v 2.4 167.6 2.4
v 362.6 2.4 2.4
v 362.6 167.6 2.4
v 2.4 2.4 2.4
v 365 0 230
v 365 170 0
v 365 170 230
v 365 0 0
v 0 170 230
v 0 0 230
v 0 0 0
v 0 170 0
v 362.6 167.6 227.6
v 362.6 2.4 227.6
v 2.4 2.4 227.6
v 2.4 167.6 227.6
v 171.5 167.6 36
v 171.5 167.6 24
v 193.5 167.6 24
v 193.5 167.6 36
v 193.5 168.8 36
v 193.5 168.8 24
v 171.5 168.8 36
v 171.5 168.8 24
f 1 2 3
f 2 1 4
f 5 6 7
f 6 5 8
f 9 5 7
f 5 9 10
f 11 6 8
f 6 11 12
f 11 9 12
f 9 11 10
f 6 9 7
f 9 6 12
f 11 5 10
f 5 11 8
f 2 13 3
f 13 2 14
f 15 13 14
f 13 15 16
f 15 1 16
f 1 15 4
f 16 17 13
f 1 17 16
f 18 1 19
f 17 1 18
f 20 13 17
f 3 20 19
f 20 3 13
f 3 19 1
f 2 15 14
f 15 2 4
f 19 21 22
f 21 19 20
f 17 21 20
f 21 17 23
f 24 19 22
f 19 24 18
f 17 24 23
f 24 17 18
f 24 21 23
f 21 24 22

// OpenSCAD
// ============================================================
//  ZhiGuo E-Nose Chamber Box  (v7)
//  Sealed gas measurement box. For photos, lift the lid and
//  use your own phone stand at a fixed height/position.
//  White tray + color-card recess keeps photo color stable.
//
//  Parts (export STL one by one):
//    sealed_box()    - big open-top box (device + sample)
//    sliding_lid()   - lid with sliding acrylic window
//    slide_stop()    - end stop glued on the lid (acrylic slide-in)
//    usb_plug()      - plug for the USB hole
//    sample_tray()   - white tray + color card recess
//
//  Acrylic sheet to buy: 3mm, cut to panel_w x panel_d
//  Free software: https://openscad.org
// ============================================================

$fn = 60;

// ---------- BOX ----------
box_w = 365;   // outer width X (device is 350mm long)
box_d = 170;   // outer depth Y (device is 150mm wide)
box_h = 230;   // outer height Z (device ~200mm + lid lip room)

wall   = 2.4;
floor  = 2.4;

// ---------- SLIDING WINDOW LID ----------
lid_t = 4;            // lid plate thickness
slide_t = 3;          // acrylic sheet thickness (buy 3mm)
slide_tol = 0.6;      // acrylic clearance inside the pocket
win_w = 200;          // window width X
win_d = 90;           // window depth Y
slide_travel = 80;    // how far the acrylic slides to open
overlap = 5;          // acrylic overlap over window when closed
rail_m = 6;           // margin from window edge to pocket wall
wall_h = slide_t + 3; // pocket wall height above the plate
tol = 0.4;            // clearance between lid lip and box
lip_d = 8;            // lid lip depth into the box

// ---------- USB / CABLE ----------
usb_w = 22; usb_h = 12; usb_center_z = 30;   // big enough for the USB cable
plug_w = 24; plug_h = 14; plug_l = 14;

// ---------- MISC ----------
post_d = 6; post_h = 6;

// ---------- COMPUTED ----------
inner_w = box_w - 2*wall;
inner_d = box_d - 2*wall;
inner_h = box_h - floor;

// sliding lid geometry
Px0 = (box_w - (win_w + slide_travel + 2*rail_m)) / 2;
Px1 = Px0 + win_w + slide_travel + 2*rail_m;
Py0 = (box_d - (win_d + 2*rail_m)) / 2;
Py1 = Py0 + win_d + 2*rail_m;
Wx0 = Px0 + rail_m;   // window left edge
Wy0 = Py0 + rail_m;   // window front edge
panel_w = win_w + 2*overlap;               // acrylic length to cut
panel_d = win_d + 2*rail_m - 2*slide_tol;  // acrylic width to cut

module sealed_box() {
  difference() {
    cube([box_w, box_d, box_h]);
    // cavity (open top)
    translate([wall, wall, floor])
      cube([inner_w, inner_d, inner_h - floor]);
    // rear USB hole
    translate([box_w/2, box_d - wall - 1, usb_center_z])
      cube([usb_w, wall + 2, usb_h], center=true);
    // breadboard posts
    for (i=[0:1]) for (j=[0:1]) {
      translate([12 + i*(inner_w - 24), 12 + j*(inner_d - 24), floor])
        cylinder(d = post_d, h = post_h);
    }
  }
}

module sliding_lid() {
  difference() {
    union() {
      // base plate
      cube([box_w, box_d, lid_t]);
      // alignment lip (hollow rim, saves plastic)
      translate([wall + tol, wall + tol, -lip_d])
        difference() {
          cube([inner_w - 2*tol, inner_d - 2*tol, lip_d]);
          translate([4, 4, -1])
            cube([inner_w - 2*tol - 8, inner_d - 2*tol - 8, lip_d + 2]);
        }
      // pocket walls: front, back, left, right
      translate([Px0, 0, lid_t]) cube([Px1 - Px0, Py0, wall_h]);
      translate([Px0, Py1, lid_t]) cube([Px1 - Px0, box_d - Py1, wall_h]);
      translate([Px1, Py0, lid_t]) cube([box_w - Px1, Py1 - Py0, wall_h]);
    }
    // window cut through the plate
    translate([Wx0, Wy0, -1]) cube([win_w, win_d, lid_t + 2]);
    // finger notch in the front wall (push the acrylic)
    translate([Wx0 - overlap - 5, -1, lid_t])
      cube([30, Py0 + 1, wall_h + 1]);
    // seal cord groove around the window (top of plate)
    translate([Wx0 - 3, Wy0 - 3, lid_t - 1.5])
      cube([win_w + 6, win_d + 6, 1.6]);
  }
}

module slide_stop() {
  // glue this at the left end of the lid AFTER sliding the acrylic in
  translate([0, Py0, lid_t])
    cube([Px0 + 2, Py1 - Py0, wall_h]);
}

module handle() {
  // glue this knob onto the acrylic sheet to slide it easily
  union() {
    cylinder(d = 14, h = 12);
    translate([0, 0, 12]) cylinder(d = 8, h = 8);
  }
}

module usb_plug() {
  cube([plug_w, plug_h, plug_l]);
}

module sample_tray() {
  tw = win_w - 40;
  td = win_d - 20;
  difference() {
    translate([0, 0, 3]) cube([tw, td, 5]);
    // shallow dish for the slices
    translate([6, 6, 5.5]) cube([tw - 12, td - 12, 3]);
    // color card recess (corner, glue a small color card in it)
    translate([8, 8, 5.5]) cube([24, 18, 3]);
  }
}

// ============================================================
//  PART SELECTOR (fool-proof)
//  Change `part` below to pick which part to export, then
//  press F6 (render) and F7 (export STL). Save each part
//  under its own file name.
//  Options: "sealed_box" "sliding_lid" "handle" "usb_plug"
//           "sample_tray" "slide_stop" "all"
// ============================================================
part = "sealed_box";

if (part == "sealed_box") {
  sealed_box();
} else if (part == "sliding_lid") {
  sliding_lid();
} else if (part == "handle") {
  handle();
} else if (part == "usb_plug") {
  usb_plug();
} else if (part == "sample_tray") {
  sample_tray();
} else {
  // all parts laid out side by side (one STL, print all at once)
  translate([box_w + 20, 0, 0]) sliding_lid();
  translate([0, box_d + 20, 0]) handle();
  translate([0, box_d + 60, 0]) usb_plug();
  translate([0, box_d + 100, 0]) sample_tray();
  translate([0, box_d + 140, 0]) slide_stop();
  sealed_box();
}
